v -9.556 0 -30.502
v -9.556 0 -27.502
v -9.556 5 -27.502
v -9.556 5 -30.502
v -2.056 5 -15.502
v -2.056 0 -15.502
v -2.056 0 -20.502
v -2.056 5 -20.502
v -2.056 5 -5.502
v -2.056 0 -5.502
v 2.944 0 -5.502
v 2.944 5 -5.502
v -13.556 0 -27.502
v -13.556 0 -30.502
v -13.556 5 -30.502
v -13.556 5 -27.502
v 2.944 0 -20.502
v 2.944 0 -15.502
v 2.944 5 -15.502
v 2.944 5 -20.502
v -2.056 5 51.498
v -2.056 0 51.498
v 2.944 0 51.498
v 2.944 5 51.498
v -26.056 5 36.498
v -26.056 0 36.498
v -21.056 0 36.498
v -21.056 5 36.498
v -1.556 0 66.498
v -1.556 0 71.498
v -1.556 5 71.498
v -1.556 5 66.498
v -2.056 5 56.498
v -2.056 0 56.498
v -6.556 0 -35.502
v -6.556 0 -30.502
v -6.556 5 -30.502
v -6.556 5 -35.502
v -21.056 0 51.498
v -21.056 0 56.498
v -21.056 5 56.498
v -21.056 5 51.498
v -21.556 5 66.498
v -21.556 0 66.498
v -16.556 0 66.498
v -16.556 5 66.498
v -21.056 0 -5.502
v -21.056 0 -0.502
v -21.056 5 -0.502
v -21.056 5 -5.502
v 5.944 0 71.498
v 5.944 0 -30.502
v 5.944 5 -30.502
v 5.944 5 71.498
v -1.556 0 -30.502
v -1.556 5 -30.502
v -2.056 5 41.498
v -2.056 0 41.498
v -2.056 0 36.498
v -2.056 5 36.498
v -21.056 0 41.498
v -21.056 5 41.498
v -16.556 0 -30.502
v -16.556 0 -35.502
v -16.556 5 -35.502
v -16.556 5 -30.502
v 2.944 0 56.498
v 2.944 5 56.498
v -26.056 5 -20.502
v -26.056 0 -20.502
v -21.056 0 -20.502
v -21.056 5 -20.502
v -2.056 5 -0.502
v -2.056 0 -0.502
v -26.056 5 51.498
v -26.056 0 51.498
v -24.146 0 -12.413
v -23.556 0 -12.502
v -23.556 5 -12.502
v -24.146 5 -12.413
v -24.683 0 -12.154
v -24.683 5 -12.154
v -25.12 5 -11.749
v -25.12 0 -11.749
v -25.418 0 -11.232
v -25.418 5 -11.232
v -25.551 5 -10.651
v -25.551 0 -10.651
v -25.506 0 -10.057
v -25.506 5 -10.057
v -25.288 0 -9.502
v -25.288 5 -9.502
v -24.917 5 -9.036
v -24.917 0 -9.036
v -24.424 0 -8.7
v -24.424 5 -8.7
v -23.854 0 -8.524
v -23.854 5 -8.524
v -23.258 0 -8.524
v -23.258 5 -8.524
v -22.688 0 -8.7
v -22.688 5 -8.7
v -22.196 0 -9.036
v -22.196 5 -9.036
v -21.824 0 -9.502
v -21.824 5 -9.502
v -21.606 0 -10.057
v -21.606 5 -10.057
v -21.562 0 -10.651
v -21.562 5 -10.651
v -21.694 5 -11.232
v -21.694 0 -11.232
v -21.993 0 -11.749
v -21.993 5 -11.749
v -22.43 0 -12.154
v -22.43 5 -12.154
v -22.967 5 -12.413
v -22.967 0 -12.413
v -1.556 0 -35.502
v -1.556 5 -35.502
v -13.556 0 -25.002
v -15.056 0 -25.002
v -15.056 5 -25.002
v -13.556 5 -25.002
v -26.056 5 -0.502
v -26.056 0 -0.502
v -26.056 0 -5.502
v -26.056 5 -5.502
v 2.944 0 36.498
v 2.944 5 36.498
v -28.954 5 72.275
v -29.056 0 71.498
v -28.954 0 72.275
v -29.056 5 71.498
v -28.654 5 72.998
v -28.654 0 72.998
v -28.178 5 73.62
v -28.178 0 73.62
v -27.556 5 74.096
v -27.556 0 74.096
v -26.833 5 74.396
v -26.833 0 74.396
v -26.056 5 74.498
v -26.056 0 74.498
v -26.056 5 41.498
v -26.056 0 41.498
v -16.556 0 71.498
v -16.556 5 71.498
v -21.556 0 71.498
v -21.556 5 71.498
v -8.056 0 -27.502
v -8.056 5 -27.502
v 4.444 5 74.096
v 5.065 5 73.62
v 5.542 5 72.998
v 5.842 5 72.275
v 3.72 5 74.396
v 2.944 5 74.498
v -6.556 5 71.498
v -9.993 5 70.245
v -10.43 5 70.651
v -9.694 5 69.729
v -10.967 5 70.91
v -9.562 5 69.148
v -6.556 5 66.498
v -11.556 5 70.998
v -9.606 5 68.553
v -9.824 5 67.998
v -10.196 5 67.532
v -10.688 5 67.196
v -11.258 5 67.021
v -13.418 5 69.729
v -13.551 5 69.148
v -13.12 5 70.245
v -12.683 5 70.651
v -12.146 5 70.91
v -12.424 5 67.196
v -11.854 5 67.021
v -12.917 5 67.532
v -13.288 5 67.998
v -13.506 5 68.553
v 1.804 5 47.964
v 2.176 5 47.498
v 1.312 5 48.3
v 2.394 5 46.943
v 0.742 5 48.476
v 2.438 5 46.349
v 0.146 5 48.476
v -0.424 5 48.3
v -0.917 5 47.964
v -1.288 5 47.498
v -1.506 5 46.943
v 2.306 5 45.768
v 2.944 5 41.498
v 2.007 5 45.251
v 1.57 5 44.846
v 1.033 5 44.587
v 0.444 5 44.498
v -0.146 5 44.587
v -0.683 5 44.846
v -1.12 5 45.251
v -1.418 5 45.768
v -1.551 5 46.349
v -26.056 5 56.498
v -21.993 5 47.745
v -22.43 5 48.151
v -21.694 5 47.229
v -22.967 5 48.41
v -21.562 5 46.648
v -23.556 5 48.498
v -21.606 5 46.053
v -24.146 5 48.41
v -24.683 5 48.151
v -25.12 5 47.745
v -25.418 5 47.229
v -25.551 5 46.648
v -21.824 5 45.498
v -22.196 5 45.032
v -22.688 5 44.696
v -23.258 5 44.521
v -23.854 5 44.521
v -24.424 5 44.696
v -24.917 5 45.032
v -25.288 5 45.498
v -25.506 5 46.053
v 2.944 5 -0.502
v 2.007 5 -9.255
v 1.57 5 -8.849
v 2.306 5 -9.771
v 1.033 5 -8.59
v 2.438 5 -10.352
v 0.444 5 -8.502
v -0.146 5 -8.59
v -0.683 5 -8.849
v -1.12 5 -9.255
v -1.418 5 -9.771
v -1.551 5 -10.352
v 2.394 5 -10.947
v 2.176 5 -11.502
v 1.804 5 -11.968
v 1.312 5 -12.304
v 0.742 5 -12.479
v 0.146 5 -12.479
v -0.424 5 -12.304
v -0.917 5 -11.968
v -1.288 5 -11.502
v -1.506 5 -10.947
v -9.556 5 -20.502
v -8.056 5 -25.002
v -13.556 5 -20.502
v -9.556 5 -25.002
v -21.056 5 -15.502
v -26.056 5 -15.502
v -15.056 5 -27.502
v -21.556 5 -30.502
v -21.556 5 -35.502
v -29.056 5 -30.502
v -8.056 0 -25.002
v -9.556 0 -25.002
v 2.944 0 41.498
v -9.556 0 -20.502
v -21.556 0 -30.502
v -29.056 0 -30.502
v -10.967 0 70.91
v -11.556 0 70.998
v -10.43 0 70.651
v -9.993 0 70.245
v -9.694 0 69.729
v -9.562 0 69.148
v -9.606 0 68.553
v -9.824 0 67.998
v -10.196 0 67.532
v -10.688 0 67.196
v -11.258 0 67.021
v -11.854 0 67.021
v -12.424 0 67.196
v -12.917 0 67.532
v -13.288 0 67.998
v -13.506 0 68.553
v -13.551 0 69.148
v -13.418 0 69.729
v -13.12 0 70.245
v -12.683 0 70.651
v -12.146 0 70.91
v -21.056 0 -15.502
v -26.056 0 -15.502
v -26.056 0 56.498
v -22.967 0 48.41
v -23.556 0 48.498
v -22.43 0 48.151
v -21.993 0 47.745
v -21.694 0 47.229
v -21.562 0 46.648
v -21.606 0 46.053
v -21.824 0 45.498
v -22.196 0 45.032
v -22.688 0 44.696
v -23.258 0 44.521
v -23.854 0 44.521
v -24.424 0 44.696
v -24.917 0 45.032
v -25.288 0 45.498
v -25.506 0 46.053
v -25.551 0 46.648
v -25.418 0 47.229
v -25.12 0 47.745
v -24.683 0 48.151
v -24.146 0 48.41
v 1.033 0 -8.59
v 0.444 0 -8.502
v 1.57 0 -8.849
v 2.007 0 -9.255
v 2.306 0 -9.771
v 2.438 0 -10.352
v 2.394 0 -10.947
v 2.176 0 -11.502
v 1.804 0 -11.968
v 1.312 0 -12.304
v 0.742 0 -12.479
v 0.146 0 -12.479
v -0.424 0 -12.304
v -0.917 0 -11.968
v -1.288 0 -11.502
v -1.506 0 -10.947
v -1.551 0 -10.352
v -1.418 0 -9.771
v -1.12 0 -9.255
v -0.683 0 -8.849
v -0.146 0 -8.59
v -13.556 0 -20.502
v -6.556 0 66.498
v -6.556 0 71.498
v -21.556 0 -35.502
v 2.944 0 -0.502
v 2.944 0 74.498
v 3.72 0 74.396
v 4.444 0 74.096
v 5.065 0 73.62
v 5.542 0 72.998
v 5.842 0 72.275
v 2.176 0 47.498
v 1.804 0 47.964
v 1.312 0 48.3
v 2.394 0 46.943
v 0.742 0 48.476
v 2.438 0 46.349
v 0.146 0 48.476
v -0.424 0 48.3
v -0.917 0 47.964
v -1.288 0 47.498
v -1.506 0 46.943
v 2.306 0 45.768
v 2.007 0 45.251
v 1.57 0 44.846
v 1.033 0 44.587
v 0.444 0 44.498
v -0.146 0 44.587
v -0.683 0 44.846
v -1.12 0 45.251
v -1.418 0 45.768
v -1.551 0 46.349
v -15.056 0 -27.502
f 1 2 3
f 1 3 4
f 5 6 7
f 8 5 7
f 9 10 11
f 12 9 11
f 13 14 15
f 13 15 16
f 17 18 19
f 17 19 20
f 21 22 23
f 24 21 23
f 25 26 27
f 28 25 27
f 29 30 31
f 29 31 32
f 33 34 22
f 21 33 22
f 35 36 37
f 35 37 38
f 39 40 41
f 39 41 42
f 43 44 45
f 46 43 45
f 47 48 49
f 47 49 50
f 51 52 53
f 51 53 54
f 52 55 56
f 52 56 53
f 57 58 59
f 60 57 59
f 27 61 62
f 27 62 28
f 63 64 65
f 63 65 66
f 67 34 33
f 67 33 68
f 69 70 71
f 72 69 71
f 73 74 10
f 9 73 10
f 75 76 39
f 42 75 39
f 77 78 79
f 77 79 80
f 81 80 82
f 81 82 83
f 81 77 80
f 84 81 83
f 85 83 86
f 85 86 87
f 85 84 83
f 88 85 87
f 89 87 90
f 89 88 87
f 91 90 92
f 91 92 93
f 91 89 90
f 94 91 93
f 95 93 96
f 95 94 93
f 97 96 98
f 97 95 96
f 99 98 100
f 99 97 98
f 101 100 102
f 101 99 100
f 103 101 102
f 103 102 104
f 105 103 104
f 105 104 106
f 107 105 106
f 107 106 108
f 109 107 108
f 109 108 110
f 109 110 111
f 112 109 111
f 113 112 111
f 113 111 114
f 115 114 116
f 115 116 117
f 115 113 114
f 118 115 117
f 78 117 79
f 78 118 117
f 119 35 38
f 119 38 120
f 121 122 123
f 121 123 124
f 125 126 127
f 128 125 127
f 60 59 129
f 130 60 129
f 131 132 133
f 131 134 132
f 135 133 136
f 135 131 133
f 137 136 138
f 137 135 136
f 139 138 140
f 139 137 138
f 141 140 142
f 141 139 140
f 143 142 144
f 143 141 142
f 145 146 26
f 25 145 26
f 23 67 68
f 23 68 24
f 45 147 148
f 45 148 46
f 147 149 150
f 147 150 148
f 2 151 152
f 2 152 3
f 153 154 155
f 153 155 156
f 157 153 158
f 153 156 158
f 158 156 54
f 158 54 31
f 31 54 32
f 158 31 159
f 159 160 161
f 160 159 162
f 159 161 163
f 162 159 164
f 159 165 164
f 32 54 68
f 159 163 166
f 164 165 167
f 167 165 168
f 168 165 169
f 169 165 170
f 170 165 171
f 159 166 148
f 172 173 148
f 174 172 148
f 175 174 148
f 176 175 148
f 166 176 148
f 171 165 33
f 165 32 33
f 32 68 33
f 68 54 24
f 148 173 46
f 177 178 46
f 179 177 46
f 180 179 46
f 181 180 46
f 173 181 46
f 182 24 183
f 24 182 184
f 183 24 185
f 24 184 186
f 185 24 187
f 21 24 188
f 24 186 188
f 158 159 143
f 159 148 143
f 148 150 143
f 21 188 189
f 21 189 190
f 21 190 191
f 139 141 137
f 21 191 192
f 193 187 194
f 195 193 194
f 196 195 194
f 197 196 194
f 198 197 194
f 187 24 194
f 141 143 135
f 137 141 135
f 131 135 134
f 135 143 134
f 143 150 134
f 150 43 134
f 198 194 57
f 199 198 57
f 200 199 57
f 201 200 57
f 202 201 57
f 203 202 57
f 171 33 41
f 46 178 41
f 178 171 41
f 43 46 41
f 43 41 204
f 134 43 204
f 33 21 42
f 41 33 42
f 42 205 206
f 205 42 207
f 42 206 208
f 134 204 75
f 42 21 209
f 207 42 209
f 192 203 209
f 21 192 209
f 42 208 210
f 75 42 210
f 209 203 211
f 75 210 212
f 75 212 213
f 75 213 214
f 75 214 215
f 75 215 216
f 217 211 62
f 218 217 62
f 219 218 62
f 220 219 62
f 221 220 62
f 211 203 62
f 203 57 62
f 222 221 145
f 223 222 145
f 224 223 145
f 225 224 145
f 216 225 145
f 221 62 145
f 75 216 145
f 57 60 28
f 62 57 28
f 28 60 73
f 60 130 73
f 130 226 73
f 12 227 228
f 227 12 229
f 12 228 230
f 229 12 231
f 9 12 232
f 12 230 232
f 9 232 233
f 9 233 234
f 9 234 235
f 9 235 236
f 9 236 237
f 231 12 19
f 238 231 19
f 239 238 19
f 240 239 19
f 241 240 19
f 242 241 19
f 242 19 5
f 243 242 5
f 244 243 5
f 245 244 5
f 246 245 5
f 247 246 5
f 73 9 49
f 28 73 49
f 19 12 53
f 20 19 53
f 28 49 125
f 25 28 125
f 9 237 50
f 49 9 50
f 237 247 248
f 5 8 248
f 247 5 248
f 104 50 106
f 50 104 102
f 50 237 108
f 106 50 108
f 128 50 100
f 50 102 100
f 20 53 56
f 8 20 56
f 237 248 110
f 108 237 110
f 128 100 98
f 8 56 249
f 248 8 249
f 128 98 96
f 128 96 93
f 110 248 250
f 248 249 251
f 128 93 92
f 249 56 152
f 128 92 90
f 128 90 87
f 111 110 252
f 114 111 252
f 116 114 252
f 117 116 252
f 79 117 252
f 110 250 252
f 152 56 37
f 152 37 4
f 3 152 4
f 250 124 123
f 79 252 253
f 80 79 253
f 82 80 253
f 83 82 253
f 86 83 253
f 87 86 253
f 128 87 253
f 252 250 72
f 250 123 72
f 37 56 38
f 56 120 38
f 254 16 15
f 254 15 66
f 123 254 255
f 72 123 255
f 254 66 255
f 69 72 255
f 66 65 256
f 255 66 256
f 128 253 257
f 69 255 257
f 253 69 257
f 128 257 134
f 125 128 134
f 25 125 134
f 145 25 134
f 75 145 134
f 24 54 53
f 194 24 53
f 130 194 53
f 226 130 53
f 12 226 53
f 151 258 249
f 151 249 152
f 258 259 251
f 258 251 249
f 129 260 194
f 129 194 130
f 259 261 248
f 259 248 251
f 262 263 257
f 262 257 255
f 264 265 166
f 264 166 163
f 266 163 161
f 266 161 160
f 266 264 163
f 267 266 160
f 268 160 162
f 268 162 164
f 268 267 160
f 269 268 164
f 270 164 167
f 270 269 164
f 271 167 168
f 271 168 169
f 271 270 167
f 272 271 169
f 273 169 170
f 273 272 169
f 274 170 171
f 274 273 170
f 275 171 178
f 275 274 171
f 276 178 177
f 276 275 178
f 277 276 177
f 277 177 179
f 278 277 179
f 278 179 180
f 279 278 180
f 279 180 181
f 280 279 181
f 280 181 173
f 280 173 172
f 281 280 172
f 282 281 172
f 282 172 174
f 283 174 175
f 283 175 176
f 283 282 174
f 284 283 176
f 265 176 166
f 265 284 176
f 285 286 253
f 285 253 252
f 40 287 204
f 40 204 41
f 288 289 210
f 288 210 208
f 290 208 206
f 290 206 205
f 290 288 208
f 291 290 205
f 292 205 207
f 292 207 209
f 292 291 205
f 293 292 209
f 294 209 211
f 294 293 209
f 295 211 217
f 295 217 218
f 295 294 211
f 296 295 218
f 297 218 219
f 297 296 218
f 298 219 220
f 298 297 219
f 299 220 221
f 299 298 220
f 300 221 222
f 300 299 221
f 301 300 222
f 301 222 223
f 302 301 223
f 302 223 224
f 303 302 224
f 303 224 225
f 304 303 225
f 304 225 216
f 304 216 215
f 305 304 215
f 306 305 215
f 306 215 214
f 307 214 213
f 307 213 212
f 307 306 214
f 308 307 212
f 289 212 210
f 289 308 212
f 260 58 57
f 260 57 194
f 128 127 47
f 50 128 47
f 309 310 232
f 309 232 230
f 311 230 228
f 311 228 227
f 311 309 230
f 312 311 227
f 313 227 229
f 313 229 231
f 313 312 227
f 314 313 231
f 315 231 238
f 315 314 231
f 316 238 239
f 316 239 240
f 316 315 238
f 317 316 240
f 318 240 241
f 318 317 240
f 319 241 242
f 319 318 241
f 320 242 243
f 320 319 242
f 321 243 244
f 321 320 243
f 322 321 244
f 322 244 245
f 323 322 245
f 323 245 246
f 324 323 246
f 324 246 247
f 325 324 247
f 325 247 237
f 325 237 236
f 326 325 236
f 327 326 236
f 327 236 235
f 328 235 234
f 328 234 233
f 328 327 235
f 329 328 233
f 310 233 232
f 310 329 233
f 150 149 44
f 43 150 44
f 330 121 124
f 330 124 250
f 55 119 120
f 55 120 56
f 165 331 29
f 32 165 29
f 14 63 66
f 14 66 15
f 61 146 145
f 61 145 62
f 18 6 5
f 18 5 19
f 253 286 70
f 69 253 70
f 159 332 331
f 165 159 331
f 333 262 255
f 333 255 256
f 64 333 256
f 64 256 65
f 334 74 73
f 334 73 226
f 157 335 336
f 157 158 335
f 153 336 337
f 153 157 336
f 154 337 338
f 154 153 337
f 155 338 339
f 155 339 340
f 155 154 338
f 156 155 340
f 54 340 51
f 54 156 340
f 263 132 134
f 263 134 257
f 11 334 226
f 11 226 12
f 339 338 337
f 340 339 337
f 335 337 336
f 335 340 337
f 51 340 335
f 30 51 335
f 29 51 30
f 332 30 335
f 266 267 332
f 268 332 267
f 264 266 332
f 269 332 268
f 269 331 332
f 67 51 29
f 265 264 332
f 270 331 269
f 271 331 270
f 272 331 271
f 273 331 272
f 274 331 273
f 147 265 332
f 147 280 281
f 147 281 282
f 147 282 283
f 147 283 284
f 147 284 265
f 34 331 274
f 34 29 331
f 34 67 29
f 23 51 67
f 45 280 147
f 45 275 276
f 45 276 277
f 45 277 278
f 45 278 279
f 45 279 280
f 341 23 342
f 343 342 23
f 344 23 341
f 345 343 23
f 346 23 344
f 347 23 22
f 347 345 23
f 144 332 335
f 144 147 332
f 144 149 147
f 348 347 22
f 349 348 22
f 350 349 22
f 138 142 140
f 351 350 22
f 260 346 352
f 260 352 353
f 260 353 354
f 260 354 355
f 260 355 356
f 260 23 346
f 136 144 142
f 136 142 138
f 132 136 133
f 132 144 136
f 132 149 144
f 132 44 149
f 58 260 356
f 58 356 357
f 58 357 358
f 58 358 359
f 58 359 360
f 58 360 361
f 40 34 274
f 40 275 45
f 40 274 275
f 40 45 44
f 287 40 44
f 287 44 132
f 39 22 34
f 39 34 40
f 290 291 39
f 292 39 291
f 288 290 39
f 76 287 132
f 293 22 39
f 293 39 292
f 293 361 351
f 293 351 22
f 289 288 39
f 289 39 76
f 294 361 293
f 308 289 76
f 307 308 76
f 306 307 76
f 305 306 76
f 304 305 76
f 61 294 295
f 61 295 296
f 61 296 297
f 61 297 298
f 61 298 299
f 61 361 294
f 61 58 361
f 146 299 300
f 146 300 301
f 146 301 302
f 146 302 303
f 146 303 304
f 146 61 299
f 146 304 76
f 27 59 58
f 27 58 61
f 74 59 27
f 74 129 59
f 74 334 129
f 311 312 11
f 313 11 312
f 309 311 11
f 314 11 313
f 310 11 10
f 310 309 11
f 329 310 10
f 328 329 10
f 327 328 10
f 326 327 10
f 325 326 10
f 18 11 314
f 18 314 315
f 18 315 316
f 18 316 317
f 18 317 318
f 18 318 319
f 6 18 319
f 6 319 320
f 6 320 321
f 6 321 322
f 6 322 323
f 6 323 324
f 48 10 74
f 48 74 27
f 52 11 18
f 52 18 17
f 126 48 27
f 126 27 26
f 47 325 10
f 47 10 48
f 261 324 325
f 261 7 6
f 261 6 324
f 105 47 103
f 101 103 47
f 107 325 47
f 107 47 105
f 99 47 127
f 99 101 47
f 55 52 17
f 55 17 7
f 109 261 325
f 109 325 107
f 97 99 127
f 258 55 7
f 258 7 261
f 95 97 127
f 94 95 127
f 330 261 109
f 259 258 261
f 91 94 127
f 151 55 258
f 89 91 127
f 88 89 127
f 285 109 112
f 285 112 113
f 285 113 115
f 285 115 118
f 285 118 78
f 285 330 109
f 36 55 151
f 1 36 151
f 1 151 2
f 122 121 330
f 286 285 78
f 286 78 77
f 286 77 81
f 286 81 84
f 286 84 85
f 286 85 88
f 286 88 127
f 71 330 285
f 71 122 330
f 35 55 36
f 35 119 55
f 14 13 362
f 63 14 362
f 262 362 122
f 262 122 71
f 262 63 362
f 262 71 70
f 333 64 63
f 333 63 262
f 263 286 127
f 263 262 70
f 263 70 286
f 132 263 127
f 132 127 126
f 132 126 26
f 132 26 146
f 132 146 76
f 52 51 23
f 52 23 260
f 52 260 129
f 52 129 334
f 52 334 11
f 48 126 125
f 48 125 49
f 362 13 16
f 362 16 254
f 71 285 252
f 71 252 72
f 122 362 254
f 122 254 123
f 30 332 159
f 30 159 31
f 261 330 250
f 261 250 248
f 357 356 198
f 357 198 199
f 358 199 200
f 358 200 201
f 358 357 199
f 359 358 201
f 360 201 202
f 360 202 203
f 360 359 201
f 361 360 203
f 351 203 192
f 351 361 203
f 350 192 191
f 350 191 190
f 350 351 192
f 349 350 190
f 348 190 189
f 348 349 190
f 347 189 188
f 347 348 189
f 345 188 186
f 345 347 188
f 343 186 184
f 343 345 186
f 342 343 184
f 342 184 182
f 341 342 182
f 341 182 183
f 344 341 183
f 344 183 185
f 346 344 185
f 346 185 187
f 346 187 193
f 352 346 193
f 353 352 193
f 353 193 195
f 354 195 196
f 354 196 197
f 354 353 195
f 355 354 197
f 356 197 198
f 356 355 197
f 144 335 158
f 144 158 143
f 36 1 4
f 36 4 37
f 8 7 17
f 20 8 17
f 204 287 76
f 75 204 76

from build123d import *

# Parameters (mm, degrees)
SKETCH1_R           = 2
SKETCH1_W           = 5
SKETCH1_H           = 5
BOSS_EXTRUDE7_DEPTH = 5
FILLET2_R           = 3


with BuildPart() as part:
    # Sketch1 → Boss-Extrude7 (new body)
    with BuildSketch(Plane(origin=(0, 0, 0), x_dir=(1, 0, 0), z_dir=(0, 1, 0))):
        Polygon((-29.056186132, 30.501621615), (-21.556186132, 30.501621615), (-21.556186132, 35.501621615), (-16.556186132, 35.501621615), (-16.556186132, 30.501621615), (-13.556186132, 30.501621615), (-13.556186132, 27.501621615), (-15.056186132, 27.501621615), (-15.056186132, 25.001621615), (-13.556186132, 25.001621615), (-13.556186132, 20.501621615), (-9.556186132, 20.501621615), (-9.556186132, 25.001621615), (-8.056186132, 25.001621615), (-8.056186132, 27.501621615), (-9.556186132, 27.501621615), (-9.556186132, 30.501621615), (-6.556186132, 30.501621615), (-6.556186132, 35.501621615), (-1.556186132, 35.501621615), (-1.556186132, 30.501621615), (5.943813868, 30.501621615), (5.943813868, -74.498378385), (-29.056186132, -74.498378385), align=None)
        with Locations(Location((0.443813868, 10.501621615, 0), (0, 0, 270))):
            Circle(SKETCH1_R, mode=Mode.SUBTRACT)
        with Locations(Location((-23.556186132, 10.501621615, 0), (0, 0, 90))):
            Circle(SKETCH1_R, mode=Mode.SUBTRACT)
        with Locations(Location((0.443813868, -46.498378385, 0), (0, 0, 90))):
            Circle(SKETCH1_R, mode=Mode.SUBTRACT)
        with Locations(Location((-23.556186132, -46.498378385, 0), (0, 0, 270))):
            Circle(SKETCH1_R, mode=Mode.SUBTRACT)
        with Locations(Location((-11.556186132, -68.998378385, 0), (0, 0, 270))):
            Circle(SKETCH1_R, mode=Mode.SUBTRACT)
        with Locations((-23.556186132, 3.001621615)):
            Rectangle(SKETCH1_W, SKETCH1_H, mode=Mode.SUBTRACT)
        with Locations((-23.556186132, 18.001621615)):
            Rectangle(SKETCH1_W, SKETCH1_H, mode=Mode.SUBTRACT)
        with Locations((0.443813868, 3.001621615)):
            Rectangle(SKETCH1_W, SKETCH1_H, mode=Mode.SUBTRACT)
        with Locations((0.443813868, 18.001621615)):
            Rectangle(SKETCH1_W, SKETCH1_H, mode=Mode.SUBTRACT)
        with Locations((0.443813868, -38.998378385)):
            Rectangle(SKETCH1_W, SKETCH1_H, mode=Mode.SUBTRACT)
        with Locations((0.443813868, -53.998378385)):
            Rectangle(SKETCH1_W, SKETCH1_H, mode=Mode.SUBTRACT)
        with Locations((-23.556186132, -53.998378385)):
            Rectangle(SKETCH1_W, SKETCH1_H, mode=Mode.SUBTRACT)
        with Locations((-23.556186132, -38.998378385)):
            Rectangle(SKETCH1_W, SKETCH1_H, mode=Mode.SUBTRACT)
        with Locations((-19.056186132, -68.998378385)):
            Rectangle(SKETCH1_W, SKETCH1_H, mode=Mode.SUBTRACT)
        with Locations((-4.056186132, -68.998378385)):
            Rectangle(SKETCH1_W, SKETCH1_H, mode=Mode.SUBTRACT)
    extrude(amount=BOSS_EXTRUDE7_DEPTH)

    # Fillet2
    fillet2_edges = [part.edges().sort_by_distance(p)[0] for p in [
        (5.943813868, 2.5, 74.498378385),
        (-29.056186132, 2.5, 74.498378385),
    ]]
    fillet(fillet2_edges, radius=FILLET2_R)


solid = part.part
